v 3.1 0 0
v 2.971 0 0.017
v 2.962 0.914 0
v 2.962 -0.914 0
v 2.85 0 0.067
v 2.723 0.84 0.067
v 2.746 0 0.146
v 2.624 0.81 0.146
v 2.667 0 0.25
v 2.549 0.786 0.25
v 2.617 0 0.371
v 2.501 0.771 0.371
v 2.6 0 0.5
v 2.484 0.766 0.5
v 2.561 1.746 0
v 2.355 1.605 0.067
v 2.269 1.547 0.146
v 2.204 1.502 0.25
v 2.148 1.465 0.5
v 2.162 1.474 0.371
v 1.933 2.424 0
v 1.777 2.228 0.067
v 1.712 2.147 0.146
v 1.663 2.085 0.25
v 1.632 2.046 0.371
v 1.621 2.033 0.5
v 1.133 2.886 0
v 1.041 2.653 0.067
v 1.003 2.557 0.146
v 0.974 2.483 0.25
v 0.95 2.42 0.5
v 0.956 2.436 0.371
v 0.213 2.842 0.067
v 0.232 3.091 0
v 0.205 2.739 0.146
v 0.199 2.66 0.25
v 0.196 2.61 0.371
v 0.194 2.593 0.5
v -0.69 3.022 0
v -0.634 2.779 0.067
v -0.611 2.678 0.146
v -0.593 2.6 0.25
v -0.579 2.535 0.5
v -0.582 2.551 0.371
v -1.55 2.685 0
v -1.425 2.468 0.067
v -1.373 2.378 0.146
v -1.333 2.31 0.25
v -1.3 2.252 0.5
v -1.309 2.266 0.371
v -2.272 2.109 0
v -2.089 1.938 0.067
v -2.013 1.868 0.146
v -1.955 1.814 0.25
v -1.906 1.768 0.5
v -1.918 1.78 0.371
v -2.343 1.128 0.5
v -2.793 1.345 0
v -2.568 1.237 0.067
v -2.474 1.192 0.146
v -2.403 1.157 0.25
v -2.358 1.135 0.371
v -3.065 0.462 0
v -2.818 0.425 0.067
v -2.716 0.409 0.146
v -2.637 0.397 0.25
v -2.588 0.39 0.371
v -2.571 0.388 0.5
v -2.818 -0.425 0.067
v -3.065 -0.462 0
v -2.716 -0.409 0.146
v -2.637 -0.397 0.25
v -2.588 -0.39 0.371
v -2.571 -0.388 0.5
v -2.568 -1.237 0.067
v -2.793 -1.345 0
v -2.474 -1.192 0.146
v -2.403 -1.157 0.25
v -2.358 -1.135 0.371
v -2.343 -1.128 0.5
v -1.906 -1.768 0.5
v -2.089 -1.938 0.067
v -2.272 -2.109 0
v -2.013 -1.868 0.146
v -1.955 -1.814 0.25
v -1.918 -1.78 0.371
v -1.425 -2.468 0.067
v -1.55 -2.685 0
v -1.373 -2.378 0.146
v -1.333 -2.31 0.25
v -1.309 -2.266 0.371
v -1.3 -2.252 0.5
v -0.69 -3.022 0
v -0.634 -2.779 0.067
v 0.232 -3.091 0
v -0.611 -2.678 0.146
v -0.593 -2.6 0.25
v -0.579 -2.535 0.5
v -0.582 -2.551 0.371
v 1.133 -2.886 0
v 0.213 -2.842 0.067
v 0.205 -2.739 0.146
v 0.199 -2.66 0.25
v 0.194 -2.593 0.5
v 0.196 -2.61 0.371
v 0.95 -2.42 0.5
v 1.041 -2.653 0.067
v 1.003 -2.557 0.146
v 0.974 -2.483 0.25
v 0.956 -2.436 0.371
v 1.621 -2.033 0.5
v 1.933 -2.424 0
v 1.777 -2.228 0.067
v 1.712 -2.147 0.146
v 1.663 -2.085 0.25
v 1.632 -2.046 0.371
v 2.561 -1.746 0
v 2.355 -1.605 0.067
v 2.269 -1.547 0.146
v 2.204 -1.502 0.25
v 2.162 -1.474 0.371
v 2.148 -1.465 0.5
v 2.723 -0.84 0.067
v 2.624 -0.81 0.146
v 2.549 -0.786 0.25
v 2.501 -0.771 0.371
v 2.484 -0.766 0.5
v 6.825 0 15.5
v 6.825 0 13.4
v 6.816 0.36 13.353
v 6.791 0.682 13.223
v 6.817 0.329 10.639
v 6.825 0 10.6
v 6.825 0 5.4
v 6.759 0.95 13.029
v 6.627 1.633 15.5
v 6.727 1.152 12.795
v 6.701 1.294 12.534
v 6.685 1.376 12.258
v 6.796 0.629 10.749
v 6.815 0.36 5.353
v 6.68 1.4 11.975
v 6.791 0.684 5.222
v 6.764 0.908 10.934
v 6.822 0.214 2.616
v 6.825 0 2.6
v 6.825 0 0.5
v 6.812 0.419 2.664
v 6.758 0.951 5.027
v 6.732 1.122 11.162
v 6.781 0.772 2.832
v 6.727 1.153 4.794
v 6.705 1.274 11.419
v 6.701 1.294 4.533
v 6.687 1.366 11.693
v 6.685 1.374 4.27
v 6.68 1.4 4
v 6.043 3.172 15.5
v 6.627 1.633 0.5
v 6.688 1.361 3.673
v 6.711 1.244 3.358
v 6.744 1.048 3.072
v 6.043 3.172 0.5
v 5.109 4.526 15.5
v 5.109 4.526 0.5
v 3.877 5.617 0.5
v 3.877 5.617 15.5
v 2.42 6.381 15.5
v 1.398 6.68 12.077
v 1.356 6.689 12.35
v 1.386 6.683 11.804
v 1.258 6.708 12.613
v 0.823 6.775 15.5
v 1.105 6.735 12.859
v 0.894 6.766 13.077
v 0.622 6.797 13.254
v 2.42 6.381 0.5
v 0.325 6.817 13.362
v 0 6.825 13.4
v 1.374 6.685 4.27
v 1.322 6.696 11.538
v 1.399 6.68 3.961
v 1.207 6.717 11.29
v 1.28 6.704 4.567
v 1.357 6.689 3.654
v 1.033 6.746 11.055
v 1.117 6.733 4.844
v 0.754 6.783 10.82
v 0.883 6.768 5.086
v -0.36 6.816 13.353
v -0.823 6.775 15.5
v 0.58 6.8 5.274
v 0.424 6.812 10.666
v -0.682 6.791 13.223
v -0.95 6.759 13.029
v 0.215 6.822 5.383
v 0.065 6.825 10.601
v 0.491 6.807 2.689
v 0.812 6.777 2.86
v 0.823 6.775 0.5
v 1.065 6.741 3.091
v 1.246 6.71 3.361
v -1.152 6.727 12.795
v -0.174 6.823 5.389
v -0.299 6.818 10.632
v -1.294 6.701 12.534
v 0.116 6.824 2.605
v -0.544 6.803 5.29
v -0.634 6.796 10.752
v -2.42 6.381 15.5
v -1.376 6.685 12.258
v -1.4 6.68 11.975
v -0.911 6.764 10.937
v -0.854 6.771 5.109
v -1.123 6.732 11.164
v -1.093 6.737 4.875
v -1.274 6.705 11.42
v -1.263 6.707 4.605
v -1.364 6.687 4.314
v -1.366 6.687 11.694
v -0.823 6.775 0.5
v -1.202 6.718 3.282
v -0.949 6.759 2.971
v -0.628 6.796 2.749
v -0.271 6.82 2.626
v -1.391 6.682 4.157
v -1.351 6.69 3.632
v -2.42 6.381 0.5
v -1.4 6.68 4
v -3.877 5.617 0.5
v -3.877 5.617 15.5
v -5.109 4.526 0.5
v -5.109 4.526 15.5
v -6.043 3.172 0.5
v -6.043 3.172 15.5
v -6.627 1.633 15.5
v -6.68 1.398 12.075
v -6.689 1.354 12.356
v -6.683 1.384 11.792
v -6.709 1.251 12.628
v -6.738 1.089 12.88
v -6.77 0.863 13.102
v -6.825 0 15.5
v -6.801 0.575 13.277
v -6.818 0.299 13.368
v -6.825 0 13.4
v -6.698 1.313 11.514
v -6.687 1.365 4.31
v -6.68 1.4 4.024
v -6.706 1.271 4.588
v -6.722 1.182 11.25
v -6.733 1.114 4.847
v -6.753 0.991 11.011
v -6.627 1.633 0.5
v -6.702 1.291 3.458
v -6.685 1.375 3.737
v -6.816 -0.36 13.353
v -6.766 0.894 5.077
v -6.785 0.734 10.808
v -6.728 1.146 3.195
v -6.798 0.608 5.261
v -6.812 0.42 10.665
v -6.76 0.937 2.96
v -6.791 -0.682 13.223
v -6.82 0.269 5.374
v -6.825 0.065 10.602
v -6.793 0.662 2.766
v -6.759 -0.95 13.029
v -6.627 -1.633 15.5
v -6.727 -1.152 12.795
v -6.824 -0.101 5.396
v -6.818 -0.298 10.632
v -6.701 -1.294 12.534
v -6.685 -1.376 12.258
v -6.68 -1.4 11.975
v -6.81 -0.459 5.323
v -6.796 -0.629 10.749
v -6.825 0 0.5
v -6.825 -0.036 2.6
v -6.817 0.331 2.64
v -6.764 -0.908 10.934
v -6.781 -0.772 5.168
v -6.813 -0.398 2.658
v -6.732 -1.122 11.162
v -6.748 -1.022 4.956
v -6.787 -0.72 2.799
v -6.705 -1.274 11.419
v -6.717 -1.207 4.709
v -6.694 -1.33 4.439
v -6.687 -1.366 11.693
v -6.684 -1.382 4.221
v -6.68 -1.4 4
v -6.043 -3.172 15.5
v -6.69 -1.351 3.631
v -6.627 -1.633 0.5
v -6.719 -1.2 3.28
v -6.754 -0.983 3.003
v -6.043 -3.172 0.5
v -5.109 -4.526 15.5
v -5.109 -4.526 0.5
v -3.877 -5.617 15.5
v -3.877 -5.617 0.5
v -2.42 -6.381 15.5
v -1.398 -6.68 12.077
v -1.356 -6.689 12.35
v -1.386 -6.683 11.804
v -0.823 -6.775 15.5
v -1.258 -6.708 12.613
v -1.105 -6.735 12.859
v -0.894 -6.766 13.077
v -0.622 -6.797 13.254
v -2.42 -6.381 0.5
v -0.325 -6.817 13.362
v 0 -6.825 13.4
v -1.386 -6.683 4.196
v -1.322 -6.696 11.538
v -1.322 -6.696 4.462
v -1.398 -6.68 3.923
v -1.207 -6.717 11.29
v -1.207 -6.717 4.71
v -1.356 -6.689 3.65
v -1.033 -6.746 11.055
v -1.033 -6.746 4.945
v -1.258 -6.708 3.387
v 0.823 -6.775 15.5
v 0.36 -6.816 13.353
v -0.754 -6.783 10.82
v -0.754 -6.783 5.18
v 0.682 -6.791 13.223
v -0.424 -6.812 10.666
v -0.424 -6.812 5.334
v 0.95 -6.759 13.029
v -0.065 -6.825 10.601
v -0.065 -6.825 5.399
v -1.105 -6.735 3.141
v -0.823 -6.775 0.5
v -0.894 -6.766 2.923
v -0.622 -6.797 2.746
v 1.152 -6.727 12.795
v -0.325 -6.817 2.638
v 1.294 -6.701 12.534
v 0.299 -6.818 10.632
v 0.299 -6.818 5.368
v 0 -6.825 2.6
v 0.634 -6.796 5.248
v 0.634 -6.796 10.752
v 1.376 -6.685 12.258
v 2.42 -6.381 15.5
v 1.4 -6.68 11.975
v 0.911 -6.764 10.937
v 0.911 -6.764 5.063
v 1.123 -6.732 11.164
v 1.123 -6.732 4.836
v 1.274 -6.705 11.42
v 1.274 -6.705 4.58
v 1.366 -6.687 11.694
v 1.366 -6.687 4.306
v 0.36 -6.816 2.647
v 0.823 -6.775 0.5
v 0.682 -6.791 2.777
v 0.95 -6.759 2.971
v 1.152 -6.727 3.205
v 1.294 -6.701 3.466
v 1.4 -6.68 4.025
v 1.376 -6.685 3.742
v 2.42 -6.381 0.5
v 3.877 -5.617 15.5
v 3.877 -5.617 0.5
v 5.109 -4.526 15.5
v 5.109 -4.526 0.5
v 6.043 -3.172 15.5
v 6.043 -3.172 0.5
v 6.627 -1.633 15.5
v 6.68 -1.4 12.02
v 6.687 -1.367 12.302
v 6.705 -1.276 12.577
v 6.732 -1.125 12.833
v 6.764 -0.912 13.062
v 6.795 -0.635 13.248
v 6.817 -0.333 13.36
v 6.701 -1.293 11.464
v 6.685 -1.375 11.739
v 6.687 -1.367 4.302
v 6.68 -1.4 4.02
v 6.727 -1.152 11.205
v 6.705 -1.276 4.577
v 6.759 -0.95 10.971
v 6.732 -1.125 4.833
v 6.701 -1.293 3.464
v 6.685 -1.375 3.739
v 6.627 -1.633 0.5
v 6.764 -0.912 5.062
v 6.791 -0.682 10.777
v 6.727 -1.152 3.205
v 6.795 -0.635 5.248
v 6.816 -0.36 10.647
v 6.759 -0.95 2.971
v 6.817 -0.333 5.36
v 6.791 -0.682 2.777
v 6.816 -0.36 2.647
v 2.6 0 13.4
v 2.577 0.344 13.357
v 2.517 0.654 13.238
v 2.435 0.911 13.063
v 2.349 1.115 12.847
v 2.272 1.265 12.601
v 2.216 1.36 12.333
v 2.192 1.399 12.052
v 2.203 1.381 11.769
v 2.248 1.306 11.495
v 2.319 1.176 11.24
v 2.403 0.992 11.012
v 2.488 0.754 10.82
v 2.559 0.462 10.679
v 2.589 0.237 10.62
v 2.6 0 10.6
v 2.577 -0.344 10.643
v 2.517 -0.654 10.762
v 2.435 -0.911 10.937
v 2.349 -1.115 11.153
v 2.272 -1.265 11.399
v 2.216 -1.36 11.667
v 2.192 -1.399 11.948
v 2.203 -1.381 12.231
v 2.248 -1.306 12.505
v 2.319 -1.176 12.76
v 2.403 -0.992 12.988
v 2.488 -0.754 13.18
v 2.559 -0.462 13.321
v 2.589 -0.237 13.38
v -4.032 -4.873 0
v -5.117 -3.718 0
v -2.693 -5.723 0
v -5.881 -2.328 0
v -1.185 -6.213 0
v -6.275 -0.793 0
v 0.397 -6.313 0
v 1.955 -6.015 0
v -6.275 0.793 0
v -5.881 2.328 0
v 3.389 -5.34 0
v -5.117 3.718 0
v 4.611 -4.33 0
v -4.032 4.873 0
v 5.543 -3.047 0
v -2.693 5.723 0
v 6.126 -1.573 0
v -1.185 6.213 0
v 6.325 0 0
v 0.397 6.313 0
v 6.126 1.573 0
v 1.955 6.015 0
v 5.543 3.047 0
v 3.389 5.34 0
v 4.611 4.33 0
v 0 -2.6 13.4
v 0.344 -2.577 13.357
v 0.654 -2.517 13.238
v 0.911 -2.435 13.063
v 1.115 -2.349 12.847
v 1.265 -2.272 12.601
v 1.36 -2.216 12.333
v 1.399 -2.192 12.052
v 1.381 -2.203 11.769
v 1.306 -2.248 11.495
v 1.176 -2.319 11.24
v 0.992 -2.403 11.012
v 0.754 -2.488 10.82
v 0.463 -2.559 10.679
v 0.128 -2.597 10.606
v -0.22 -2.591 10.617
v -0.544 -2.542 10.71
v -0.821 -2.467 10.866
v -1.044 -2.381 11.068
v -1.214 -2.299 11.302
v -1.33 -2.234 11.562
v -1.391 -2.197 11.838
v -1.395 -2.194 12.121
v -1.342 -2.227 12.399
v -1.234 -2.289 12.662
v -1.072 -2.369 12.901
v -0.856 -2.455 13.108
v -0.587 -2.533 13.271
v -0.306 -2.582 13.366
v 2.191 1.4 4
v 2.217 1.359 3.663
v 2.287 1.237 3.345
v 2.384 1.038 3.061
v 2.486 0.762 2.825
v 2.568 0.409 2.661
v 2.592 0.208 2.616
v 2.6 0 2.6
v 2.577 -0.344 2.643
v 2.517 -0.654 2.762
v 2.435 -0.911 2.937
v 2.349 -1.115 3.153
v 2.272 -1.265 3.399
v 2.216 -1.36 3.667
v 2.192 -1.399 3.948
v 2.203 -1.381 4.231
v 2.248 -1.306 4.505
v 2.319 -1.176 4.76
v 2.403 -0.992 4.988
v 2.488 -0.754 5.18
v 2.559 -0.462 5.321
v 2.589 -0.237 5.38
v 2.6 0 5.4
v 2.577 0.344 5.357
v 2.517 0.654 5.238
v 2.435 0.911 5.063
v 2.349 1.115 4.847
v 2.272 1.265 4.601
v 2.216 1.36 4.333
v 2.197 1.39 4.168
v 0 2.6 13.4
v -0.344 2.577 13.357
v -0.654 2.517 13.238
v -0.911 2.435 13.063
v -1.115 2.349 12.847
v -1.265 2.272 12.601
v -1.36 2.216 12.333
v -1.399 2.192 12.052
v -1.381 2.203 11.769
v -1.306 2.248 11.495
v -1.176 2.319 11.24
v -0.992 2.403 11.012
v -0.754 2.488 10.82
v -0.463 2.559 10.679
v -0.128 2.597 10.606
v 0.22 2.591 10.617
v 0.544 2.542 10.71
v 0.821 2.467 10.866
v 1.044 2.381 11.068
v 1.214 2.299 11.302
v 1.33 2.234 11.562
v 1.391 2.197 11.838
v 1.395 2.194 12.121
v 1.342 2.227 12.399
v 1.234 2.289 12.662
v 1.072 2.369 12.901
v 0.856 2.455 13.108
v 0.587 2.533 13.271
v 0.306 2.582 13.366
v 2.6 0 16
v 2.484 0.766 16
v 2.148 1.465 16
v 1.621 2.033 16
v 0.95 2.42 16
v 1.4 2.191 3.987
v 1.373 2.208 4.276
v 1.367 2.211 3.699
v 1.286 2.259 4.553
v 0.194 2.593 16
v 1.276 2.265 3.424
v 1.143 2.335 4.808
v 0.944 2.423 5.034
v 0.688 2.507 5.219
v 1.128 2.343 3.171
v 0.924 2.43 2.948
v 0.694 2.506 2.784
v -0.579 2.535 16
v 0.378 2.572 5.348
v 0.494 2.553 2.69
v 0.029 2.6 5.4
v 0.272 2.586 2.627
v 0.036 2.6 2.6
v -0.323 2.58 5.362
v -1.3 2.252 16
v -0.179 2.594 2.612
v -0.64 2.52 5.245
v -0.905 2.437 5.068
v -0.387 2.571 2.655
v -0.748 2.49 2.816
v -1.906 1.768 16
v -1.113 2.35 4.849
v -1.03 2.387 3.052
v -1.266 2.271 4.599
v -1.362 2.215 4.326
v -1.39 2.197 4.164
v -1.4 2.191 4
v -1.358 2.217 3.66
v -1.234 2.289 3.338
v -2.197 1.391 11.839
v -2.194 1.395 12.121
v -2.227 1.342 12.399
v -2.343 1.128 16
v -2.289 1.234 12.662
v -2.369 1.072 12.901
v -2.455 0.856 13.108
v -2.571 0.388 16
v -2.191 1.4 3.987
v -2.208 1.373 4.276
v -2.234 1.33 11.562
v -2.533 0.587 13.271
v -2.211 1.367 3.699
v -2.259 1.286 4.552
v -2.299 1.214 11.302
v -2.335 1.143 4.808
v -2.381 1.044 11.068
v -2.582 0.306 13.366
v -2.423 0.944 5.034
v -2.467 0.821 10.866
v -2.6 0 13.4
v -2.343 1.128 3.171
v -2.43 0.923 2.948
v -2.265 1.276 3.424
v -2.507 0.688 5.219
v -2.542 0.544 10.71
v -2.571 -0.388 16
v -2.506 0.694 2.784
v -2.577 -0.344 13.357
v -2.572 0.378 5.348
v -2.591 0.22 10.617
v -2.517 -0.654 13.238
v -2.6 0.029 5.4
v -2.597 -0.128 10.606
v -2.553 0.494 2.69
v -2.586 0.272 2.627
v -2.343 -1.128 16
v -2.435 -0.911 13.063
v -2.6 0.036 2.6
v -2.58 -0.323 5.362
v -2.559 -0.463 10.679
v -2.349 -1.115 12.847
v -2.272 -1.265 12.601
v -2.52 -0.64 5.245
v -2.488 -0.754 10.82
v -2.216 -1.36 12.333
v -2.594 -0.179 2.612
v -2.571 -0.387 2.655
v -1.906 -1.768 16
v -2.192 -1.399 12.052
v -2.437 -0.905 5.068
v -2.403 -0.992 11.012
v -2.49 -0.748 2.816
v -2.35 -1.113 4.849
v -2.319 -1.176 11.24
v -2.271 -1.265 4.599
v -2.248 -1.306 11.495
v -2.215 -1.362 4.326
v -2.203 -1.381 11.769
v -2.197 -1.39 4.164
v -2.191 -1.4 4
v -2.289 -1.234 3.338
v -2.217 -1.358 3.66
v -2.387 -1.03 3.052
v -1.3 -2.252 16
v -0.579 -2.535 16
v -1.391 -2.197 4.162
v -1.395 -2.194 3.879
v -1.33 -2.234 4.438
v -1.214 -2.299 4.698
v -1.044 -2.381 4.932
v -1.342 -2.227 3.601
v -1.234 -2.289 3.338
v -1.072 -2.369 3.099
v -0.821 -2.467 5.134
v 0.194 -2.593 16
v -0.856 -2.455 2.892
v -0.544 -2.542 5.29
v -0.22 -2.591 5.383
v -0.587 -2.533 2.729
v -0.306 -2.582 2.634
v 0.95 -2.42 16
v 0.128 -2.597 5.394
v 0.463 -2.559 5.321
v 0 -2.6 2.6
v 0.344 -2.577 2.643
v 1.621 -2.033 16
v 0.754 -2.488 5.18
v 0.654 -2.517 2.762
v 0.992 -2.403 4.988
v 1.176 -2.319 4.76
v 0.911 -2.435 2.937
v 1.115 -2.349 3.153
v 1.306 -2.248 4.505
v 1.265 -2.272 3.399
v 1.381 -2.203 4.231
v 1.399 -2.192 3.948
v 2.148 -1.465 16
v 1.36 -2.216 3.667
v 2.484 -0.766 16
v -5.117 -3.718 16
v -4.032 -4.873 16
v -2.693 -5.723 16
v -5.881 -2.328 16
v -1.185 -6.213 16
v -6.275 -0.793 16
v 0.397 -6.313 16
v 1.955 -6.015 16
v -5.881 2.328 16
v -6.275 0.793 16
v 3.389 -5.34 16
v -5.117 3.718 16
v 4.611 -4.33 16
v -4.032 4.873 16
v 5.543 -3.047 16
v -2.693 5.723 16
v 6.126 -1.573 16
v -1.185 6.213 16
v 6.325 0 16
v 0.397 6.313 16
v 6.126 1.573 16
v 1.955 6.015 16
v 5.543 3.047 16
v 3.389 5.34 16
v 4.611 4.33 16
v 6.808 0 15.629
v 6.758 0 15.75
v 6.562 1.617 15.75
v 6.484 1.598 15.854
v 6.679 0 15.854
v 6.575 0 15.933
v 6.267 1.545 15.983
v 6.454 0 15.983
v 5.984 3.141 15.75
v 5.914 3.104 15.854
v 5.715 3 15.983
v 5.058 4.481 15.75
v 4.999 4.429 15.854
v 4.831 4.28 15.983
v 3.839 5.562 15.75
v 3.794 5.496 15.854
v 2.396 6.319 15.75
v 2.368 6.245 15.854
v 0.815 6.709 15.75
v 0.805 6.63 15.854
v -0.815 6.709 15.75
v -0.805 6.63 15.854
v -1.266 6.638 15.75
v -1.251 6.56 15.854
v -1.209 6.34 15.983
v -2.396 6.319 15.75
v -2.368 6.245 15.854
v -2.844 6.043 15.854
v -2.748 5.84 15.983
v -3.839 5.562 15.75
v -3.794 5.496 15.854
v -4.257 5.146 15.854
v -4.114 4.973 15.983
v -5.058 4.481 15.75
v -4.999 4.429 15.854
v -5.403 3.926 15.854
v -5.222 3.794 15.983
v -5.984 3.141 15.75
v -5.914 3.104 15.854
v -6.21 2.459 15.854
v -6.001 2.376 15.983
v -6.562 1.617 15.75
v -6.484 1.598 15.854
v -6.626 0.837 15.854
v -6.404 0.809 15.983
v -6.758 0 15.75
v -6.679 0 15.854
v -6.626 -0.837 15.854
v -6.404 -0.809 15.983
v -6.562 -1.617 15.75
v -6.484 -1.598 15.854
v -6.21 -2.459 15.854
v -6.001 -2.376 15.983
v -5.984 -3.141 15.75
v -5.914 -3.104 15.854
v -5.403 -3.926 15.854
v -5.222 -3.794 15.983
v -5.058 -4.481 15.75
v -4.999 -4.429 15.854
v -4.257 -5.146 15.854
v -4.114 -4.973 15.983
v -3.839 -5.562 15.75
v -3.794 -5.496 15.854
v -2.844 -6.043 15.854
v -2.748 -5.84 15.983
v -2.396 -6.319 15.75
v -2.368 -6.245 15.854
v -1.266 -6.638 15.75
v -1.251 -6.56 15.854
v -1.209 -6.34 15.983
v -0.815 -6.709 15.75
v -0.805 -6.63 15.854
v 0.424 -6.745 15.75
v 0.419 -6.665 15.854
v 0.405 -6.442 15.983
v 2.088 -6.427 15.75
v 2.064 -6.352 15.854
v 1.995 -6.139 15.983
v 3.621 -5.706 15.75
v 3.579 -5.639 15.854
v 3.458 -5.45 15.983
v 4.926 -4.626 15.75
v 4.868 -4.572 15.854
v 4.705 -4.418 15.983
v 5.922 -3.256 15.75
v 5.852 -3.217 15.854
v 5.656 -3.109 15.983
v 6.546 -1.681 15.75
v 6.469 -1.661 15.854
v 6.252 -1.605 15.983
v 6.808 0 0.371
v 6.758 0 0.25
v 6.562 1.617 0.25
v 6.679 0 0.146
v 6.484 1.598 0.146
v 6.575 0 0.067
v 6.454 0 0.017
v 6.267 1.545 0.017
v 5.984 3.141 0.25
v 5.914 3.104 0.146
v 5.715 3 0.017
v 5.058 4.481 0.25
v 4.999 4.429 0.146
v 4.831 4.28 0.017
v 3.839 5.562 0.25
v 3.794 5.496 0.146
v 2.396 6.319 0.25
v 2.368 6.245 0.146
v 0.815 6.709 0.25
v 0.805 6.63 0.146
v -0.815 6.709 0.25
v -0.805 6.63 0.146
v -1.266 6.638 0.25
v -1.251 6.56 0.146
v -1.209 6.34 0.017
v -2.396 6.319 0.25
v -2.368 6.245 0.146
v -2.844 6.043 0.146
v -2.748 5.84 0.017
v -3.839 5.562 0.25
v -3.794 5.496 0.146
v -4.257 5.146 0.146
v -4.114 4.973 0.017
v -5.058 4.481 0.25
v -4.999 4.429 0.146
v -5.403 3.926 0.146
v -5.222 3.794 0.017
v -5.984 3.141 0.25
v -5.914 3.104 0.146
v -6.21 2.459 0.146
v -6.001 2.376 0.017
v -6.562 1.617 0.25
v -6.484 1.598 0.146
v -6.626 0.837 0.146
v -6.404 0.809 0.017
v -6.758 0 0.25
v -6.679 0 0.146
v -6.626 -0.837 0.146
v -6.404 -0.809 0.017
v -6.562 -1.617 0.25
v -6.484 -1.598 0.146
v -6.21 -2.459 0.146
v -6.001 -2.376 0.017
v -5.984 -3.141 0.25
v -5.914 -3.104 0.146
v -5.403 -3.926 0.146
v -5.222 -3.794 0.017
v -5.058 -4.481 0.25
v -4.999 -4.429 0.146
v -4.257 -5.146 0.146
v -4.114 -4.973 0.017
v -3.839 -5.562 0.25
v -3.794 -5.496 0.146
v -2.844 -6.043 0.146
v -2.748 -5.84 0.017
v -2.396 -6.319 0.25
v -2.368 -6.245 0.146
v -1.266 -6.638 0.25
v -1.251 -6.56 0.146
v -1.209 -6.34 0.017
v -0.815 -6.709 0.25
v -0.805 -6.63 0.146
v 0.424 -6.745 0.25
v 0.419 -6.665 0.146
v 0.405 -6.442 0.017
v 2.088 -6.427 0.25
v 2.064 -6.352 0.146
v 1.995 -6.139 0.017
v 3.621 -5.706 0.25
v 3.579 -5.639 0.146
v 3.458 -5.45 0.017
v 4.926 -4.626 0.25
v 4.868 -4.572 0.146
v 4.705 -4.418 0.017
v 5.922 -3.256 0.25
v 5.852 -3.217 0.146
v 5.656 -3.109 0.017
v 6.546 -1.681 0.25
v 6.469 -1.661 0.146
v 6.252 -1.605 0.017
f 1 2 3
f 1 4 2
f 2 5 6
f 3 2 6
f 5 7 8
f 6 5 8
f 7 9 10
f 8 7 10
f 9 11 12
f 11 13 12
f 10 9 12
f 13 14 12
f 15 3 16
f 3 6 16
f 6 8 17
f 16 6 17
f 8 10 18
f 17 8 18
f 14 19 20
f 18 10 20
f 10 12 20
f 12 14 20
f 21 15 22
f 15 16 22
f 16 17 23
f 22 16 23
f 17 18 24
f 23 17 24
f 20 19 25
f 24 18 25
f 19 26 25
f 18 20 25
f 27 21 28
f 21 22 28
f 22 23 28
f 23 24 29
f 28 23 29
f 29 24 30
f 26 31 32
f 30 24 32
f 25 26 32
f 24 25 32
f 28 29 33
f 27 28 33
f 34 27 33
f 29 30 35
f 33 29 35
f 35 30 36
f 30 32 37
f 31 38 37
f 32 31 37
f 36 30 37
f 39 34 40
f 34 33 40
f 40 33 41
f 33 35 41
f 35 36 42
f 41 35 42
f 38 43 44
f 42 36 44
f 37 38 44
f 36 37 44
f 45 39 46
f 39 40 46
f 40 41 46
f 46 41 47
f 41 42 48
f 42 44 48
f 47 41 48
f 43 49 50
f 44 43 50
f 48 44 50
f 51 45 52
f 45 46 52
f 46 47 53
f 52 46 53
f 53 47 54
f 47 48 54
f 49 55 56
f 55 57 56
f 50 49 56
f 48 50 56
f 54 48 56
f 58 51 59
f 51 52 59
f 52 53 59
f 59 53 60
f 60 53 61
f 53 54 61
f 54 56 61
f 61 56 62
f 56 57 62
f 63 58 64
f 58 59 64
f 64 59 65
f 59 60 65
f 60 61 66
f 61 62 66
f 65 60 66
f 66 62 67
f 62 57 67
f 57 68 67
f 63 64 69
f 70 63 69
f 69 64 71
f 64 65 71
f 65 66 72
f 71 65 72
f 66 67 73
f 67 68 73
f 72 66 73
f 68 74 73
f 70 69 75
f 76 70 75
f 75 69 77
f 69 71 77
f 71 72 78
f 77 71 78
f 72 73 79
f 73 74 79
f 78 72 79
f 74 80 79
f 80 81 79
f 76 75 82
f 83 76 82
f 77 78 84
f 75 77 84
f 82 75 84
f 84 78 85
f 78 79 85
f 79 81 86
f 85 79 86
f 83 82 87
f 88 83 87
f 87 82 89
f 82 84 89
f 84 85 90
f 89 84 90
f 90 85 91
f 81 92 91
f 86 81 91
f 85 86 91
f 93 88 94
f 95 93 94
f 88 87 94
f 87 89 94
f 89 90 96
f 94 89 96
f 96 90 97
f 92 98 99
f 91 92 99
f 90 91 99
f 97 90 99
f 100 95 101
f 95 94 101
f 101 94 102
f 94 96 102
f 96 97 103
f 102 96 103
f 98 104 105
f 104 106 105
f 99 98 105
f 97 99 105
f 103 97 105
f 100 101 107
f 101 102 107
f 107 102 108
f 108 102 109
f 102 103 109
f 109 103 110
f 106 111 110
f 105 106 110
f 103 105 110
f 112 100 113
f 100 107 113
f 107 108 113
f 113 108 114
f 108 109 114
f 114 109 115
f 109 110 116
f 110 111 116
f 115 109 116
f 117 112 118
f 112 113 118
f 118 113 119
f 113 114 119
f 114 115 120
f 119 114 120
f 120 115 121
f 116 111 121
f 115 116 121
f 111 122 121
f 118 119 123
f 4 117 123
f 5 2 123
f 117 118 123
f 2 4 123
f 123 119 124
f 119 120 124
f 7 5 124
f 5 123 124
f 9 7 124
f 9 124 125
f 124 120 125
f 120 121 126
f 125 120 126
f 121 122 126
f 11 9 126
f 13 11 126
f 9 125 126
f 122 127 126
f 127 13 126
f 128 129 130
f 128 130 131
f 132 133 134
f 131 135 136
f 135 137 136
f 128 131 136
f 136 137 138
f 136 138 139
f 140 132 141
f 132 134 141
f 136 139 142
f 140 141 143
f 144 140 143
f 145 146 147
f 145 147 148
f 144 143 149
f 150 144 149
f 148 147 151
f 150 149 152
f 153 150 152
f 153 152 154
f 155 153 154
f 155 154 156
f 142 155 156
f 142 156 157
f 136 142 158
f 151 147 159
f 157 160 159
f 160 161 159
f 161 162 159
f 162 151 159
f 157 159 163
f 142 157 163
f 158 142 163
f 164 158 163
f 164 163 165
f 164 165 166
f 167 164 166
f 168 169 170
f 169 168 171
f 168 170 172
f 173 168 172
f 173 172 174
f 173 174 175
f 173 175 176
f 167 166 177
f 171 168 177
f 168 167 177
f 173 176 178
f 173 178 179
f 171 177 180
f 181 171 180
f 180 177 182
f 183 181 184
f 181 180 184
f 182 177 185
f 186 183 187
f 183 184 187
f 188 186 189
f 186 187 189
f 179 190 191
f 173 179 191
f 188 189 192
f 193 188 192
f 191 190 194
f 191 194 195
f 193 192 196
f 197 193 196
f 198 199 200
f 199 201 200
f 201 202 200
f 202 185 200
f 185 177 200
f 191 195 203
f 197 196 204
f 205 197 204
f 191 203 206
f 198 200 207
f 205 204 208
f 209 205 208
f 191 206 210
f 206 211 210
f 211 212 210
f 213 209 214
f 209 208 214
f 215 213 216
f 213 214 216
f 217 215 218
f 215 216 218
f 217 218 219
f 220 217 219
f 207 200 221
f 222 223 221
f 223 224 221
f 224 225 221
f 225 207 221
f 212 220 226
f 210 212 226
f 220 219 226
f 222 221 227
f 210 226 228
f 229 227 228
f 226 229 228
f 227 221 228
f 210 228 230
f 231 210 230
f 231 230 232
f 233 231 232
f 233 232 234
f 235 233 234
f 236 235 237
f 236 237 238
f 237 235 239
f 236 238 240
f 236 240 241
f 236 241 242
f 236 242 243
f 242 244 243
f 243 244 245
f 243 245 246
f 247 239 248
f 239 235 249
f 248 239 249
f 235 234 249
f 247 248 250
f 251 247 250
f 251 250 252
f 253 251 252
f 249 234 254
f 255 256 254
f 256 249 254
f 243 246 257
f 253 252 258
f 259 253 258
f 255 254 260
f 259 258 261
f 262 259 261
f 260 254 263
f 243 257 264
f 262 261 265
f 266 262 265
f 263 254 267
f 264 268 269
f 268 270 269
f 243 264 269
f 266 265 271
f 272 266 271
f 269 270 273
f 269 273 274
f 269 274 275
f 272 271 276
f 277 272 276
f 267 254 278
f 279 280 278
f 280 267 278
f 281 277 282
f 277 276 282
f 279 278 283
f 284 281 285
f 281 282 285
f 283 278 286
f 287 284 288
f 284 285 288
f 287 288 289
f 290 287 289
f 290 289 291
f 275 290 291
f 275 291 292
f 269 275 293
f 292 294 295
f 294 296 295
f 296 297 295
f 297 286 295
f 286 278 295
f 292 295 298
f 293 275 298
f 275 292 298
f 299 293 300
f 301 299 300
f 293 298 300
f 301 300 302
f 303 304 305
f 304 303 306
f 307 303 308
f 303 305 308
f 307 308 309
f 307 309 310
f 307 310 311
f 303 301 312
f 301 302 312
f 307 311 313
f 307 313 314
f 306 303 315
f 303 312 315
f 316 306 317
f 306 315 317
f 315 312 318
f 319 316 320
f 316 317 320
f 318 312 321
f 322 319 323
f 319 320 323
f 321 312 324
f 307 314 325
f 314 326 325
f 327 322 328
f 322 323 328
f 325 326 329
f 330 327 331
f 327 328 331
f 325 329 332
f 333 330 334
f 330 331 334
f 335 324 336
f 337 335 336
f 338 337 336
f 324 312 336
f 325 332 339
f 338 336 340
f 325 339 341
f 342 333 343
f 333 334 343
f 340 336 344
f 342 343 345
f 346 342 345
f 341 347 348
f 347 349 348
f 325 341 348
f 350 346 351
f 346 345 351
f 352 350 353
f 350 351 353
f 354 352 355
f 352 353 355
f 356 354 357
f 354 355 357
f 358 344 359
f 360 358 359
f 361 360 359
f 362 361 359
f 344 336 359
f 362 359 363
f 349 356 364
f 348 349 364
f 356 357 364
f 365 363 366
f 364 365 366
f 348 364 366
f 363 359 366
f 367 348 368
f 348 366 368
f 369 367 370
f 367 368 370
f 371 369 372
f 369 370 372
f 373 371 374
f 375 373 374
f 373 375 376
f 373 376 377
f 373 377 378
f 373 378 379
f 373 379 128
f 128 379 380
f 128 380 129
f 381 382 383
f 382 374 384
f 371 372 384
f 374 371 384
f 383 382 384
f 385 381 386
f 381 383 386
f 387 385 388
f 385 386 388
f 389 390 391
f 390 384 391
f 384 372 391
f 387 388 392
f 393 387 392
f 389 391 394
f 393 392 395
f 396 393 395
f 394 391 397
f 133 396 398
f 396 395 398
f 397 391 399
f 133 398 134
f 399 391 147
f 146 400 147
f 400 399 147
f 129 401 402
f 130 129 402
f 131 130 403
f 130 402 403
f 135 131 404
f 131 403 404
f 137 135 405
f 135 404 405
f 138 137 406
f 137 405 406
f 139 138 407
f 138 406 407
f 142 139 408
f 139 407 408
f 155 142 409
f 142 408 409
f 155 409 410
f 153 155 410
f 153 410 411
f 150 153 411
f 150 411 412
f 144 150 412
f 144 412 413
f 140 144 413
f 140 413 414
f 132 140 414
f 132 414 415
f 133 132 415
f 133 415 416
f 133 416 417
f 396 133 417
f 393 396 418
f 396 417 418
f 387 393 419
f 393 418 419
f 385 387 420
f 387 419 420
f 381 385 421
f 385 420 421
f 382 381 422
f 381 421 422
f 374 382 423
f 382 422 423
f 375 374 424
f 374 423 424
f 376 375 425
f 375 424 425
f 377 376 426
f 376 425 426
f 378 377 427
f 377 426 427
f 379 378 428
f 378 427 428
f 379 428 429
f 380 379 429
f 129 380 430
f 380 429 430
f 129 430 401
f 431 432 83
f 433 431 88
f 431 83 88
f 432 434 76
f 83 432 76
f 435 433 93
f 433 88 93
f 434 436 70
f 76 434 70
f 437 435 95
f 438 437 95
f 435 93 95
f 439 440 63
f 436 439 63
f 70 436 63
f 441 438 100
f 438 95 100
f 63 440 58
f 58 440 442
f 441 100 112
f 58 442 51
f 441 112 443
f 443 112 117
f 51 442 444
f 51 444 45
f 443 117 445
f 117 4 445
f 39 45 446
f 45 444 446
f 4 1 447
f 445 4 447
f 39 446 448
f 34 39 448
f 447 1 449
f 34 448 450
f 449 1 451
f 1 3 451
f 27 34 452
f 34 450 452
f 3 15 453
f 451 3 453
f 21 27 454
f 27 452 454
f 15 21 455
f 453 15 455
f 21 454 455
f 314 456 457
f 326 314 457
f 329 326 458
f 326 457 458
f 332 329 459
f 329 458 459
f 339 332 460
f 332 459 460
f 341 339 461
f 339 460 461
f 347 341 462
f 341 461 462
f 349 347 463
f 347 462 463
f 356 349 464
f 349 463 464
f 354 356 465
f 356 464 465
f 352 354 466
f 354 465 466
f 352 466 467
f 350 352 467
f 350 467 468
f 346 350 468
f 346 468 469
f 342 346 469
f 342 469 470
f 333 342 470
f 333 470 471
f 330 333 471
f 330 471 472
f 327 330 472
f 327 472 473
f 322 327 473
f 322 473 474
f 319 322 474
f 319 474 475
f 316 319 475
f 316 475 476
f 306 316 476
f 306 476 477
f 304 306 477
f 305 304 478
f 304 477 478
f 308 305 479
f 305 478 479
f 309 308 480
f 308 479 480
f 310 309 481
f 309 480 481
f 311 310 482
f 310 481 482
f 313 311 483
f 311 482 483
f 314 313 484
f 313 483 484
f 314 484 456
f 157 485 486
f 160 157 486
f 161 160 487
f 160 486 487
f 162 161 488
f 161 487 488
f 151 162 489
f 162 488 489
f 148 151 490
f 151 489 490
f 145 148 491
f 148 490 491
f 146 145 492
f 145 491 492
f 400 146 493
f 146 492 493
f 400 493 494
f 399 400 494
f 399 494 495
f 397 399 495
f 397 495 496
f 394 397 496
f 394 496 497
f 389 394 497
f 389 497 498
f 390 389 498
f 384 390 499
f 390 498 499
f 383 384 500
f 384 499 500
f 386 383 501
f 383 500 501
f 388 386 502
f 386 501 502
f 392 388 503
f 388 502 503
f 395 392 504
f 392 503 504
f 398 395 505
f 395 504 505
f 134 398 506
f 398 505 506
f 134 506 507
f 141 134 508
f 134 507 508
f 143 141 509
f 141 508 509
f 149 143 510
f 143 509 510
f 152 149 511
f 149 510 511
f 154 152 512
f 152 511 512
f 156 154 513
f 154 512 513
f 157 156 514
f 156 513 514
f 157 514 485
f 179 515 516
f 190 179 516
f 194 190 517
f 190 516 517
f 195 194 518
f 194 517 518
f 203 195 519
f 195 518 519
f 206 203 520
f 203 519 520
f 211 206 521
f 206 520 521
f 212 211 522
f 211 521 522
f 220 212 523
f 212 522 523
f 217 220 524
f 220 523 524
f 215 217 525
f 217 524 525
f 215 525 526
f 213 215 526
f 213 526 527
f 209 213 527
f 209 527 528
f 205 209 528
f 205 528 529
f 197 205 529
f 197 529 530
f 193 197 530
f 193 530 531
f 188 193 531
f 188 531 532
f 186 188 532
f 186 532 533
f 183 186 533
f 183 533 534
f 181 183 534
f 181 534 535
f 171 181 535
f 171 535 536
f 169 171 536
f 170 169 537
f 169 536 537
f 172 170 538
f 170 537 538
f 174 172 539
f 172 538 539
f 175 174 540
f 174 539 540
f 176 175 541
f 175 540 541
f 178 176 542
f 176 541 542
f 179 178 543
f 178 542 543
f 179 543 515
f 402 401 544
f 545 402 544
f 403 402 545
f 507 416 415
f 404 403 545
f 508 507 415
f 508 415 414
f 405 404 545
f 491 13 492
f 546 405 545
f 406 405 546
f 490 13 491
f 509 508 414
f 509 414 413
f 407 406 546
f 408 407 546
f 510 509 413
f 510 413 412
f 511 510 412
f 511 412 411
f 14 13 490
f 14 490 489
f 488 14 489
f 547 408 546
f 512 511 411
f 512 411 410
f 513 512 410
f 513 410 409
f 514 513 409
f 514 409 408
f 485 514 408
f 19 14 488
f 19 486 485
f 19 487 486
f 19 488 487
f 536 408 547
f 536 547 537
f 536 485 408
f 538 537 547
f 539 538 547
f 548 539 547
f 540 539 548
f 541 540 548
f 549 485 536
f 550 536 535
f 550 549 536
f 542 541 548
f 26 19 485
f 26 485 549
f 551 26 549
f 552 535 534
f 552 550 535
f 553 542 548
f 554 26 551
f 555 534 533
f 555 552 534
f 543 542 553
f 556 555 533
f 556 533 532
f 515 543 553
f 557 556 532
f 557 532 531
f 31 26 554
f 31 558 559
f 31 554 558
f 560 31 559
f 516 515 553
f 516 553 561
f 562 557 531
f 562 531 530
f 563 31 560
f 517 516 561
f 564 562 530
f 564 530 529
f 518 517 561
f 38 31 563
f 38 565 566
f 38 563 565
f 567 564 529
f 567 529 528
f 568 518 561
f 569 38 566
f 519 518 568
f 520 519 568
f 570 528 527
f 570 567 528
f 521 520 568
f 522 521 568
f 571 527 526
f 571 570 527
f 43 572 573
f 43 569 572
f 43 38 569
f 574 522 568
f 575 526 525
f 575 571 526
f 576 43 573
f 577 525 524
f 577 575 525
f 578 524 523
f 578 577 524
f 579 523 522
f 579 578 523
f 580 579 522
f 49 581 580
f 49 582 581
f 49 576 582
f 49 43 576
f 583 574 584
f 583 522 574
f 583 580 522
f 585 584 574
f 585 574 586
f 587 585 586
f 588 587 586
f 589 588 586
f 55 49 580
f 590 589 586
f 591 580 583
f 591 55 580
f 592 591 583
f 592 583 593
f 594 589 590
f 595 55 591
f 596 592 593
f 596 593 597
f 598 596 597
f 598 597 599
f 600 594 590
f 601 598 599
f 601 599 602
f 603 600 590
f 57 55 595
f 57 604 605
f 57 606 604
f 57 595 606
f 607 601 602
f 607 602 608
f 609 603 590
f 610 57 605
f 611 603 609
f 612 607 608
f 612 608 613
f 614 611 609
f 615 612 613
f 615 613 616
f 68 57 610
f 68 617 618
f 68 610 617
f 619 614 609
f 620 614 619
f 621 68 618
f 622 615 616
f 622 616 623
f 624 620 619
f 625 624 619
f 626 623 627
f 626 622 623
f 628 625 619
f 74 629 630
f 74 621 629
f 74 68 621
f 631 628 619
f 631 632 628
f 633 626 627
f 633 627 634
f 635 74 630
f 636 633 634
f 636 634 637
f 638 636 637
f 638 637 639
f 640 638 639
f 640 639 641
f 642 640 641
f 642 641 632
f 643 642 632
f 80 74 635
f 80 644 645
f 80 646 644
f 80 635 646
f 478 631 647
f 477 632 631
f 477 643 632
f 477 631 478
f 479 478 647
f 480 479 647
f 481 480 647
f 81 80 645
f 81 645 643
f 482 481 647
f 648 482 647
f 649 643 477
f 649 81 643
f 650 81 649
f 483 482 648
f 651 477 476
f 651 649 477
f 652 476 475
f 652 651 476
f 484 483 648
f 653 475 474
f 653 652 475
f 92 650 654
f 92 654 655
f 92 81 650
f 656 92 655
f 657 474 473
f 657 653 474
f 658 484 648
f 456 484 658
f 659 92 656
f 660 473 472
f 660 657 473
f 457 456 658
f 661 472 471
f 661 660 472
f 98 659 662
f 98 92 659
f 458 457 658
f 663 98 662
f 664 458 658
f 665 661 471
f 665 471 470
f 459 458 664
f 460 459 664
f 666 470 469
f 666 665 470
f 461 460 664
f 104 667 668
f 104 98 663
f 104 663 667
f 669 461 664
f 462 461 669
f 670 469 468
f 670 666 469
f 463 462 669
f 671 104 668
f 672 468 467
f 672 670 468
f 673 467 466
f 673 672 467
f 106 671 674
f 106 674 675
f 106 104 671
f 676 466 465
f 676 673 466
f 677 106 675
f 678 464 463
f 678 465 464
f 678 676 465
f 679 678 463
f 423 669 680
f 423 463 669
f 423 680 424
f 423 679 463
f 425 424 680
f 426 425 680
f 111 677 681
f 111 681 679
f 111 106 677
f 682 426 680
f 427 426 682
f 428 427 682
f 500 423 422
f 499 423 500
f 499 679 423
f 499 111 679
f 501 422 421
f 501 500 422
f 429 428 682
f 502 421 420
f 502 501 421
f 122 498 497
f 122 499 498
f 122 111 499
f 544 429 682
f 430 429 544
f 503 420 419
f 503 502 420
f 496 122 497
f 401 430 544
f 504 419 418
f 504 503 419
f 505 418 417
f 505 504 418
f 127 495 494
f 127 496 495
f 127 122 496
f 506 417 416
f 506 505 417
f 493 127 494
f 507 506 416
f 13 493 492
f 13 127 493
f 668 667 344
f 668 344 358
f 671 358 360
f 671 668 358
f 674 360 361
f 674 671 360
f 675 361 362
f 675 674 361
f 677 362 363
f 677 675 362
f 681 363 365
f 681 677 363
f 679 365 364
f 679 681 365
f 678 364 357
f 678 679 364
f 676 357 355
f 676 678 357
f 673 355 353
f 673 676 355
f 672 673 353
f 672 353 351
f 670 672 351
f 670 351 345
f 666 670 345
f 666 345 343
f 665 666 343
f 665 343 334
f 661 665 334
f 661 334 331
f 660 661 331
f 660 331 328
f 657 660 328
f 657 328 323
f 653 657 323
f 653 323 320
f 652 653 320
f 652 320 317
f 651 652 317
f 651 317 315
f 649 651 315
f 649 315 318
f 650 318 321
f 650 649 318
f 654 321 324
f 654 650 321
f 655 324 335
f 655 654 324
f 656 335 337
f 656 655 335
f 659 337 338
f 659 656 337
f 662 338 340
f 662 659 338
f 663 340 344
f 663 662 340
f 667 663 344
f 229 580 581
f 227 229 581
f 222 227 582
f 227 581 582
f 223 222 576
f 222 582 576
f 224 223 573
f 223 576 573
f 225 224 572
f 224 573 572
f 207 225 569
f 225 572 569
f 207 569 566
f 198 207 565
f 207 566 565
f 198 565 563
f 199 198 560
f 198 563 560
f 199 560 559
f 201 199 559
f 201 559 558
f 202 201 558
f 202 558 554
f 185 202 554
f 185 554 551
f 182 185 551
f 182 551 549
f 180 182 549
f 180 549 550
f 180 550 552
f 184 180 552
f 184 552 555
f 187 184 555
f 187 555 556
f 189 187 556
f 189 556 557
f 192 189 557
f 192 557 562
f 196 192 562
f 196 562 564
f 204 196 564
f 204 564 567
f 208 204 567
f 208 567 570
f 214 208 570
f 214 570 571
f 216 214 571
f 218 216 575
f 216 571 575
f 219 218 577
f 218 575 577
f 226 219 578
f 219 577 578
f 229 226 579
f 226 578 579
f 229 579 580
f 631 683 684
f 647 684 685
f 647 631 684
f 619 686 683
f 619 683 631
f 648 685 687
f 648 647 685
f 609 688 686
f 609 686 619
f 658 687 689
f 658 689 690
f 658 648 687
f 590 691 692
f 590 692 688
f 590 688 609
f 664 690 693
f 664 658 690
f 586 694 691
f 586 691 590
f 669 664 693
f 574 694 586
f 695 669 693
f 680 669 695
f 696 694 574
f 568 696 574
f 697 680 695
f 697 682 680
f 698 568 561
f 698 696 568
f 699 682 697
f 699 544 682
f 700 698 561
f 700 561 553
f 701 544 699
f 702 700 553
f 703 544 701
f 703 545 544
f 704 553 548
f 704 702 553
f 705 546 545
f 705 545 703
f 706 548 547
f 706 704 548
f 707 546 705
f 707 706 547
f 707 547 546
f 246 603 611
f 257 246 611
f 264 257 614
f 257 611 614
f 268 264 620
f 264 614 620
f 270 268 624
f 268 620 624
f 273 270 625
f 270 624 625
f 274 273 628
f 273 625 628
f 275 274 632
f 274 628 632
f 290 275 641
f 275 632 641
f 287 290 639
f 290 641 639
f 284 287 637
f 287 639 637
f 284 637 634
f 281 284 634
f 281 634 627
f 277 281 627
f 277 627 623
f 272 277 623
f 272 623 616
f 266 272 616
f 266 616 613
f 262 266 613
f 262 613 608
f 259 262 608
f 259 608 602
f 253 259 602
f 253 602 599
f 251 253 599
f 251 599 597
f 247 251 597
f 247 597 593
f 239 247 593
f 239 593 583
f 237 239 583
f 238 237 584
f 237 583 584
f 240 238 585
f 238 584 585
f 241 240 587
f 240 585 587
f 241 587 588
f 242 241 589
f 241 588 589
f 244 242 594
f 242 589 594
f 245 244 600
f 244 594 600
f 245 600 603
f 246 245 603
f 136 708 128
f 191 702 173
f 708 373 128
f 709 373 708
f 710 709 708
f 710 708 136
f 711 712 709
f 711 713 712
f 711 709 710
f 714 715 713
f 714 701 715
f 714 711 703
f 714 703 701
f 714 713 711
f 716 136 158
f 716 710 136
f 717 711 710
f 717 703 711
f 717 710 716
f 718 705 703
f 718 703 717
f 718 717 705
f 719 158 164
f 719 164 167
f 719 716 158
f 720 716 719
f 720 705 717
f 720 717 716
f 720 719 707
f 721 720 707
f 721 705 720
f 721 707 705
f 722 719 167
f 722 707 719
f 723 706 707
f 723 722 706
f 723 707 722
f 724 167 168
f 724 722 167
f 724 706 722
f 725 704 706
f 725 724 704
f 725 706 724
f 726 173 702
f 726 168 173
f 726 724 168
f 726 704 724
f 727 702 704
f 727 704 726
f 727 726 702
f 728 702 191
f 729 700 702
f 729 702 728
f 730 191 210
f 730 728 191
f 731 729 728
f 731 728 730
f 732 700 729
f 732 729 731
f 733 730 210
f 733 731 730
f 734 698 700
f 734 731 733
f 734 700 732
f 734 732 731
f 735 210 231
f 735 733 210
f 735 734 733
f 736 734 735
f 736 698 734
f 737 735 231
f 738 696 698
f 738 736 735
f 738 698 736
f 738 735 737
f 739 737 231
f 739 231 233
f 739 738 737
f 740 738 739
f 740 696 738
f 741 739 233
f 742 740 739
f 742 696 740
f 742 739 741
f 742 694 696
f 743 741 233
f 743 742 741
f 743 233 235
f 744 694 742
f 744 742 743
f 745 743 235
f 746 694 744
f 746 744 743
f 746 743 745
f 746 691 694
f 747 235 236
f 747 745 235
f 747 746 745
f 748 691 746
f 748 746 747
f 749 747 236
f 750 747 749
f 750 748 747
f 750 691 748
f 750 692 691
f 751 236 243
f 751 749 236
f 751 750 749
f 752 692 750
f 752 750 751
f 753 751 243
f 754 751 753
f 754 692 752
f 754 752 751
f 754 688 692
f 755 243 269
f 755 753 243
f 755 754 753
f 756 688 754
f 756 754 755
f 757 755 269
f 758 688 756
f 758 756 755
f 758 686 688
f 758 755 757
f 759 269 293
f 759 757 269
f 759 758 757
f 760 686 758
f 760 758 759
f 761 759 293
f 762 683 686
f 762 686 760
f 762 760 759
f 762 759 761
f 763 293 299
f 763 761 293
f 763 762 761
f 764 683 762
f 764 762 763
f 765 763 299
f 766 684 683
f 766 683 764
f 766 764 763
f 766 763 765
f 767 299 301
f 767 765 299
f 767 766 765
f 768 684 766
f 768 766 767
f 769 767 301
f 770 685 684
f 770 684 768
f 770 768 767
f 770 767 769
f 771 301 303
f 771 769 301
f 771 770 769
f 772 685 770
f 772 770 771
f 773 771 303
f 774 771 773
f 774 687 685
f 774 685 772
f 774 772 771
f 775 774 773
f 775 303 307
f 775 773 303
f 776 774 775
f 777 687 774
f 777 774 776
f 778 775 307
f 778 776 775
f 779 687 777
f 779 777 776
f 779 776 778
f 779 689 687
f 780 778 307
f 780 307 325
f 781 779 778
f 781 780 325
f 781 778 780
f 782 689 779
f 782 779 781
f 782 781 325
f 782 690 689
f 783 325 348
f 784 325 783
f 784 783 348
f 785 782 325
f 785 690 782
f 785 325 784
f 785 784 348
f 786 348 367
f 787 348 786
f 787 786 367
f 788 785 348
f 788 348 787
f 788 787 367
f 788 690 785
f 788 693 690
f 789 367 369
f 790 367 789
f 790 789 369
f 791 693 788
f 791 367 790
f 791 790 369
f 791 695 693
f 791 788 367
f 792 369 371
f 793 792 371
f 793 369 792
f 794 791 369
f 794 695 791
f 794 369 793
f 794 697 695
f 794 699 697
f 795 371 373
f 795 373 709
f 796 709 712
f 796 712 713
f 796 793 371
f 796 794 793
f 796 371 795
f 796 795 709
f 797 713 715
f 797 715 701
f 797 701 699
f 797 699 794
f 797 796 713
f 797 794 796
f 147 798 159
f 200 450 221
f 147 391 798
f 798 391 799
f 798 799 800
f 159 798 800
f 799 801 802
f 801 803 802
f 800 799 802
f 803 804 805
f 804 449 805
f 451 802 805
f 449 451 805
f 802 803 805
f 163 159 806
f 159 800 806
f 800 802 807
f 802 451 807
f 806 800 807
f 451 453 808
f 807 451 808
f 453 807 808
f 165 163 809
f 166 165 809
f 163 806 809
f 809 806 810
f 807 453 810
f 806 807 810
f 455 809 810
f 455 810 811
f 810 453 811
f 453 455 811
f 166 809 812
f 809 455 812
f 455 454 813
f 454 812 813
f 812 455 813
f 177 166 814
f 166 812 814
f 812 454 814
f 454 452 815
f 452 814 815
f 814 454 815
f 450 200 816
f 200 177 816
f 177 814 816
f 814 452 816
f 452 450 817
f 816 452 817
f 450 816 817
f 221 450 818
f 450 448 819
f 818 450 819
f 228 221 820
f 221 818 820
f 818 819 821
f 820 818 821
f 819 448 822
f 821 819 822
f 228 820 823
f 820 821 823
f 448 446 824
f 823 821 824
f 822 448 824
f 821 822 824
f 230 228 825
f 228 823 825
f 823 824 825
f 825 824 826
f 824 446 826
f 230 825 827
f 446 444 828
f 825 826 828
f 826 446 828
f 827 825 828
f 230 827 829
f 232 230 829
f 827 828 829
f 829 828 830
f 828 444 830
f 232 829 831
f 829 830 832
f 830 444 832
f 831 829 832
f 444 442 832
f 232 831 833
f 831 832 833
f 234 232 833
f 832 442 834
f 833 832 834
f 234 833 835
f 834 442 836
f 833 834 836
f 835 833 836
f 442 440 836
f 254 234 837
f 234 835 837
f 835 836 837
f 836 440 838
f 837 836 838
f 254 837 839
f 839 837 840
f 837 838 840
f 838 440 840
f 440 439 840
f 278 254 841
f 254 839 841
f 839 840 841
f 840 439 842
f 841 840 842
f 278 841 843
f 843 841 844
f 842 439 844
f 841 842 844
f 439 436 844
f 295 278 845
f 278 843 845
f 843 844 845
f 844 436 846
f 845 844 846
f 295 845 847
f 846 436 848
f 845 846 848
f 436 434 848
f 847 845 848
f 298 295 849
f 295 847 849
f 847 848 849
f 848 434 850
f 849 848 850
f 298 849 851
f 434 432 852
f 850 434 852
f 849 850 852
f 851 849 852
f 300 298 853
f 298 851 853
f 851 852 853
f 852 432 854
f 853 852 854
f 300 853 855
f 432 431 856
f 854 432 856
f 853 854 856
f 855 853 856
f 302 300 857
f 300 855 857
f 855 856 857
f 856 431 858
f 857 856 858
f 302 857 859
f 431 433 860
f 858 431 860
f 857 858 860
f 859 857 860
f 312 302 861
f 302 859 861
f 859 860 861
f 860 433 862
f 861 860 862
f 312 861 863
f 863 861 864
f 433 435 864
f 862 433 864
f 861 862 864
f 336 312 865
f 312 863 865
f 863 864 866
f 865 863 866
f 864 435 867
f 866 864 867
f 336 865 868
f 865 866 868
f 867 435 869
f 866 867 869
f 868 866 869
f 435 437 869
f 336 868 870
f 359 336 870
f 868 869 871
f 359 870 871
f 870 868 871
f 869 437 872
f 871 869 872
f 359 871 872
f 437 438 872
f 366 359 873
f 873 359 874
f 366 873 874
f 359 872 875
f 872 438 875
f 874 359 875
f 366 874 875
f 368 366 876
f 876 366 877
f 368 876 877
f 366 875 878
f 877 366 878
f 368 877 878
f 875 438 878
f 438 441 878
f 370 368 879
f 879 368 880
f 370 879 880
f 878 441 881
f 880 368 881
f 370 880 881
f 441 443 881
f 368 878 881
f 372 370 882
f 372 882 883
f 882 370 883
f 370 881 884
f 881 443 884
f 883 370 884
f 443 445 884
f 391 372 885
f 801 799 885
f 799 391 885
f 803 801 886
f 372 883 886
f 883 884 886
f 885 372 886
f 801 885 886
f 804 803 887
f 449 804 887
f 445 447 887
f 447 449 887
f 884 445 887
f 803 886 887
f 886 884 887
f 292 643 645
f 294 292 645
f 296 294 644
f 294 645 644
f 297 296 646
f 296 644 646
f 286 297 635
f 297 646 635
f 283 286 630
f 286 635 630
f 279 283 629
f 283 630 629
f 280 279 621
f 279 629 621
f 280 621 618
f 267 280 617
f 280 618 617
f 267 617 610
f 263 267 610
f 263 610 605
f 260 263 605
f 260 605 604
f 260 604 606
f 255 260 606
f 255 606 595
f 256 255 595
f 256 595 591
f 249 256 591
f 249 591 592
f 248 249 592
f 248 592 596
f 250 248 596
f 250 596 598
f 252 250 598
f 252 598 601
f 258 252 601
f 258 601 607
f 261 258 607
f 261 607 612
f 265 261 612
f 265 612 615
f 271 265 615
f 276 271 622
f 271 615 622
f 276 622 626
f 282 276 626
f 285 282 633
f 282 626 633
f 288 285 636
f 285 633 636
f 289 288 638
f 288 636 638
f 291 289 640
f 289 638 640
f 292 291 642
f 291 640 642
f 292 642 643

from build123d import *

# Parameters (mm, degrees)
SKETCH1_R               = 6.825
SKETCH1_R_2             = 2.6
BOSS_EXTRUDE1_DEPTH     = 16
SKETCH3_R               = 1.4
CUT_EXTRUDE2_DEPTH      = 10
CIRPATTERN1_COUNT       = 4
FILLET1_R               = 0.5
MIRROR1_COPY_1_SKETCH_R = 1.4
MIRROR1_COPY_1_DEPTH    = 10
MIRROR1_COPY_2_SKETCH_R = 1.4
MIRROR1_COPY_2_DEPTH    = 10
MIRROR1_COPY_3_SKETCH_R = 1.4
MIRROR1_COPY_3_DEPTH    = 10


with BuildPart() as part:
    # Sketch1 → Boss-Extrude1 (new body)
    with BuildSketch(Plane.XY):
        Circle(SKETCH1_R)
        Circle(SKETCH1_R_2, mode=Mode.SUBTRACT)
    extrude(amount=BOSS_EXTRUDE1_DEPTH)

    # Sketch3 → Cut-Extrude2 (cut)
    with BuildSketch(Plane(origin=(0, 0, 0), x_dir=(1, 0, 0), z_dir=(0, 1, 0))):
        with Locations(Location((0, -12, 0), (0, 0, 270))):
            Circle(SKETCH3_R)
    cut_extrude2 = extrude(amount=-CUT_EXTRUDE2_DEPTH, mode=Mode.SUBTRACT)

    # CirPattern1: Cut-Extrude2 ×4 about axis
    cirpattern1_axis = Axis((0, 0, 16), (0, 0, -1))
    for i in range(1, CIRPATTERN1_COUNT):
        add(cut_extrude2.rotate(cirpattern1_axis, i * 360 / CIRPATTERN1_COUNT), mode=Mode.SUBTRACT)

    # Fillet1
    fillet1_edges = [part.edges().sort_by_distance(p)[0] for p in [
        (-6.825, 0, 0),
        (-6.825, 0, 16),
        (-2.6, 0, 0),
    ]]
    fillet(fillet1_edges, radius=FILLET1_R)

    # Mirror1: Cut-Extrude2 across plane
    add(cut_extrude2.mirror(Plane.XY.offset(8)), mode=Mode.SUBTRACT)

    # Mirror1 copy 1 sketch → Mirror1 copy 1 (cut)
    with BuildSketch(Plane(origin=(0, 0, 16), x_dir=(0, -1, 0), z_dir=(1, 0, 0))):
        with Locations((0, 12)):
            Circle(MIRROR1_COPY_1_SKETCH_R)
    extrude(amount=-MIRROR1_COPY_1_DEPTH, mode=Mode.SUBTRACT)

    # Mirror1 copy 2 sketch → Mirror1 copy 2 (cut)
    with BuildSketch(Plane(origin=(0, 0, 16), x_dir=(-1, 0, 0), z_dir=(0, -1, 0))):
        with Locations((0, 12)):
            Circle(MIRROR1_COPY_2_SKETCH_R)
    extrude(amount=-MIRROR1_COPY_2_DEPTH, mode=Mode.SUBTRACT)

    # Mirror1 copy 3 sketch → Mirror1 copy 3 (cut)
    with BuildSketch(Plane(origin=(0, 0, 16), x_dir=(0, 1, 0), z_dir=(-1, 0, 0))):
        with Locations((0, 12)):
            Circle(MIRROR1_COPY_3_SKETCH_R)
    extrude(amount=-MIRROR1_COPY_3_DEPTH, mode=Mode.SUBTRACT)


solid = part.part
